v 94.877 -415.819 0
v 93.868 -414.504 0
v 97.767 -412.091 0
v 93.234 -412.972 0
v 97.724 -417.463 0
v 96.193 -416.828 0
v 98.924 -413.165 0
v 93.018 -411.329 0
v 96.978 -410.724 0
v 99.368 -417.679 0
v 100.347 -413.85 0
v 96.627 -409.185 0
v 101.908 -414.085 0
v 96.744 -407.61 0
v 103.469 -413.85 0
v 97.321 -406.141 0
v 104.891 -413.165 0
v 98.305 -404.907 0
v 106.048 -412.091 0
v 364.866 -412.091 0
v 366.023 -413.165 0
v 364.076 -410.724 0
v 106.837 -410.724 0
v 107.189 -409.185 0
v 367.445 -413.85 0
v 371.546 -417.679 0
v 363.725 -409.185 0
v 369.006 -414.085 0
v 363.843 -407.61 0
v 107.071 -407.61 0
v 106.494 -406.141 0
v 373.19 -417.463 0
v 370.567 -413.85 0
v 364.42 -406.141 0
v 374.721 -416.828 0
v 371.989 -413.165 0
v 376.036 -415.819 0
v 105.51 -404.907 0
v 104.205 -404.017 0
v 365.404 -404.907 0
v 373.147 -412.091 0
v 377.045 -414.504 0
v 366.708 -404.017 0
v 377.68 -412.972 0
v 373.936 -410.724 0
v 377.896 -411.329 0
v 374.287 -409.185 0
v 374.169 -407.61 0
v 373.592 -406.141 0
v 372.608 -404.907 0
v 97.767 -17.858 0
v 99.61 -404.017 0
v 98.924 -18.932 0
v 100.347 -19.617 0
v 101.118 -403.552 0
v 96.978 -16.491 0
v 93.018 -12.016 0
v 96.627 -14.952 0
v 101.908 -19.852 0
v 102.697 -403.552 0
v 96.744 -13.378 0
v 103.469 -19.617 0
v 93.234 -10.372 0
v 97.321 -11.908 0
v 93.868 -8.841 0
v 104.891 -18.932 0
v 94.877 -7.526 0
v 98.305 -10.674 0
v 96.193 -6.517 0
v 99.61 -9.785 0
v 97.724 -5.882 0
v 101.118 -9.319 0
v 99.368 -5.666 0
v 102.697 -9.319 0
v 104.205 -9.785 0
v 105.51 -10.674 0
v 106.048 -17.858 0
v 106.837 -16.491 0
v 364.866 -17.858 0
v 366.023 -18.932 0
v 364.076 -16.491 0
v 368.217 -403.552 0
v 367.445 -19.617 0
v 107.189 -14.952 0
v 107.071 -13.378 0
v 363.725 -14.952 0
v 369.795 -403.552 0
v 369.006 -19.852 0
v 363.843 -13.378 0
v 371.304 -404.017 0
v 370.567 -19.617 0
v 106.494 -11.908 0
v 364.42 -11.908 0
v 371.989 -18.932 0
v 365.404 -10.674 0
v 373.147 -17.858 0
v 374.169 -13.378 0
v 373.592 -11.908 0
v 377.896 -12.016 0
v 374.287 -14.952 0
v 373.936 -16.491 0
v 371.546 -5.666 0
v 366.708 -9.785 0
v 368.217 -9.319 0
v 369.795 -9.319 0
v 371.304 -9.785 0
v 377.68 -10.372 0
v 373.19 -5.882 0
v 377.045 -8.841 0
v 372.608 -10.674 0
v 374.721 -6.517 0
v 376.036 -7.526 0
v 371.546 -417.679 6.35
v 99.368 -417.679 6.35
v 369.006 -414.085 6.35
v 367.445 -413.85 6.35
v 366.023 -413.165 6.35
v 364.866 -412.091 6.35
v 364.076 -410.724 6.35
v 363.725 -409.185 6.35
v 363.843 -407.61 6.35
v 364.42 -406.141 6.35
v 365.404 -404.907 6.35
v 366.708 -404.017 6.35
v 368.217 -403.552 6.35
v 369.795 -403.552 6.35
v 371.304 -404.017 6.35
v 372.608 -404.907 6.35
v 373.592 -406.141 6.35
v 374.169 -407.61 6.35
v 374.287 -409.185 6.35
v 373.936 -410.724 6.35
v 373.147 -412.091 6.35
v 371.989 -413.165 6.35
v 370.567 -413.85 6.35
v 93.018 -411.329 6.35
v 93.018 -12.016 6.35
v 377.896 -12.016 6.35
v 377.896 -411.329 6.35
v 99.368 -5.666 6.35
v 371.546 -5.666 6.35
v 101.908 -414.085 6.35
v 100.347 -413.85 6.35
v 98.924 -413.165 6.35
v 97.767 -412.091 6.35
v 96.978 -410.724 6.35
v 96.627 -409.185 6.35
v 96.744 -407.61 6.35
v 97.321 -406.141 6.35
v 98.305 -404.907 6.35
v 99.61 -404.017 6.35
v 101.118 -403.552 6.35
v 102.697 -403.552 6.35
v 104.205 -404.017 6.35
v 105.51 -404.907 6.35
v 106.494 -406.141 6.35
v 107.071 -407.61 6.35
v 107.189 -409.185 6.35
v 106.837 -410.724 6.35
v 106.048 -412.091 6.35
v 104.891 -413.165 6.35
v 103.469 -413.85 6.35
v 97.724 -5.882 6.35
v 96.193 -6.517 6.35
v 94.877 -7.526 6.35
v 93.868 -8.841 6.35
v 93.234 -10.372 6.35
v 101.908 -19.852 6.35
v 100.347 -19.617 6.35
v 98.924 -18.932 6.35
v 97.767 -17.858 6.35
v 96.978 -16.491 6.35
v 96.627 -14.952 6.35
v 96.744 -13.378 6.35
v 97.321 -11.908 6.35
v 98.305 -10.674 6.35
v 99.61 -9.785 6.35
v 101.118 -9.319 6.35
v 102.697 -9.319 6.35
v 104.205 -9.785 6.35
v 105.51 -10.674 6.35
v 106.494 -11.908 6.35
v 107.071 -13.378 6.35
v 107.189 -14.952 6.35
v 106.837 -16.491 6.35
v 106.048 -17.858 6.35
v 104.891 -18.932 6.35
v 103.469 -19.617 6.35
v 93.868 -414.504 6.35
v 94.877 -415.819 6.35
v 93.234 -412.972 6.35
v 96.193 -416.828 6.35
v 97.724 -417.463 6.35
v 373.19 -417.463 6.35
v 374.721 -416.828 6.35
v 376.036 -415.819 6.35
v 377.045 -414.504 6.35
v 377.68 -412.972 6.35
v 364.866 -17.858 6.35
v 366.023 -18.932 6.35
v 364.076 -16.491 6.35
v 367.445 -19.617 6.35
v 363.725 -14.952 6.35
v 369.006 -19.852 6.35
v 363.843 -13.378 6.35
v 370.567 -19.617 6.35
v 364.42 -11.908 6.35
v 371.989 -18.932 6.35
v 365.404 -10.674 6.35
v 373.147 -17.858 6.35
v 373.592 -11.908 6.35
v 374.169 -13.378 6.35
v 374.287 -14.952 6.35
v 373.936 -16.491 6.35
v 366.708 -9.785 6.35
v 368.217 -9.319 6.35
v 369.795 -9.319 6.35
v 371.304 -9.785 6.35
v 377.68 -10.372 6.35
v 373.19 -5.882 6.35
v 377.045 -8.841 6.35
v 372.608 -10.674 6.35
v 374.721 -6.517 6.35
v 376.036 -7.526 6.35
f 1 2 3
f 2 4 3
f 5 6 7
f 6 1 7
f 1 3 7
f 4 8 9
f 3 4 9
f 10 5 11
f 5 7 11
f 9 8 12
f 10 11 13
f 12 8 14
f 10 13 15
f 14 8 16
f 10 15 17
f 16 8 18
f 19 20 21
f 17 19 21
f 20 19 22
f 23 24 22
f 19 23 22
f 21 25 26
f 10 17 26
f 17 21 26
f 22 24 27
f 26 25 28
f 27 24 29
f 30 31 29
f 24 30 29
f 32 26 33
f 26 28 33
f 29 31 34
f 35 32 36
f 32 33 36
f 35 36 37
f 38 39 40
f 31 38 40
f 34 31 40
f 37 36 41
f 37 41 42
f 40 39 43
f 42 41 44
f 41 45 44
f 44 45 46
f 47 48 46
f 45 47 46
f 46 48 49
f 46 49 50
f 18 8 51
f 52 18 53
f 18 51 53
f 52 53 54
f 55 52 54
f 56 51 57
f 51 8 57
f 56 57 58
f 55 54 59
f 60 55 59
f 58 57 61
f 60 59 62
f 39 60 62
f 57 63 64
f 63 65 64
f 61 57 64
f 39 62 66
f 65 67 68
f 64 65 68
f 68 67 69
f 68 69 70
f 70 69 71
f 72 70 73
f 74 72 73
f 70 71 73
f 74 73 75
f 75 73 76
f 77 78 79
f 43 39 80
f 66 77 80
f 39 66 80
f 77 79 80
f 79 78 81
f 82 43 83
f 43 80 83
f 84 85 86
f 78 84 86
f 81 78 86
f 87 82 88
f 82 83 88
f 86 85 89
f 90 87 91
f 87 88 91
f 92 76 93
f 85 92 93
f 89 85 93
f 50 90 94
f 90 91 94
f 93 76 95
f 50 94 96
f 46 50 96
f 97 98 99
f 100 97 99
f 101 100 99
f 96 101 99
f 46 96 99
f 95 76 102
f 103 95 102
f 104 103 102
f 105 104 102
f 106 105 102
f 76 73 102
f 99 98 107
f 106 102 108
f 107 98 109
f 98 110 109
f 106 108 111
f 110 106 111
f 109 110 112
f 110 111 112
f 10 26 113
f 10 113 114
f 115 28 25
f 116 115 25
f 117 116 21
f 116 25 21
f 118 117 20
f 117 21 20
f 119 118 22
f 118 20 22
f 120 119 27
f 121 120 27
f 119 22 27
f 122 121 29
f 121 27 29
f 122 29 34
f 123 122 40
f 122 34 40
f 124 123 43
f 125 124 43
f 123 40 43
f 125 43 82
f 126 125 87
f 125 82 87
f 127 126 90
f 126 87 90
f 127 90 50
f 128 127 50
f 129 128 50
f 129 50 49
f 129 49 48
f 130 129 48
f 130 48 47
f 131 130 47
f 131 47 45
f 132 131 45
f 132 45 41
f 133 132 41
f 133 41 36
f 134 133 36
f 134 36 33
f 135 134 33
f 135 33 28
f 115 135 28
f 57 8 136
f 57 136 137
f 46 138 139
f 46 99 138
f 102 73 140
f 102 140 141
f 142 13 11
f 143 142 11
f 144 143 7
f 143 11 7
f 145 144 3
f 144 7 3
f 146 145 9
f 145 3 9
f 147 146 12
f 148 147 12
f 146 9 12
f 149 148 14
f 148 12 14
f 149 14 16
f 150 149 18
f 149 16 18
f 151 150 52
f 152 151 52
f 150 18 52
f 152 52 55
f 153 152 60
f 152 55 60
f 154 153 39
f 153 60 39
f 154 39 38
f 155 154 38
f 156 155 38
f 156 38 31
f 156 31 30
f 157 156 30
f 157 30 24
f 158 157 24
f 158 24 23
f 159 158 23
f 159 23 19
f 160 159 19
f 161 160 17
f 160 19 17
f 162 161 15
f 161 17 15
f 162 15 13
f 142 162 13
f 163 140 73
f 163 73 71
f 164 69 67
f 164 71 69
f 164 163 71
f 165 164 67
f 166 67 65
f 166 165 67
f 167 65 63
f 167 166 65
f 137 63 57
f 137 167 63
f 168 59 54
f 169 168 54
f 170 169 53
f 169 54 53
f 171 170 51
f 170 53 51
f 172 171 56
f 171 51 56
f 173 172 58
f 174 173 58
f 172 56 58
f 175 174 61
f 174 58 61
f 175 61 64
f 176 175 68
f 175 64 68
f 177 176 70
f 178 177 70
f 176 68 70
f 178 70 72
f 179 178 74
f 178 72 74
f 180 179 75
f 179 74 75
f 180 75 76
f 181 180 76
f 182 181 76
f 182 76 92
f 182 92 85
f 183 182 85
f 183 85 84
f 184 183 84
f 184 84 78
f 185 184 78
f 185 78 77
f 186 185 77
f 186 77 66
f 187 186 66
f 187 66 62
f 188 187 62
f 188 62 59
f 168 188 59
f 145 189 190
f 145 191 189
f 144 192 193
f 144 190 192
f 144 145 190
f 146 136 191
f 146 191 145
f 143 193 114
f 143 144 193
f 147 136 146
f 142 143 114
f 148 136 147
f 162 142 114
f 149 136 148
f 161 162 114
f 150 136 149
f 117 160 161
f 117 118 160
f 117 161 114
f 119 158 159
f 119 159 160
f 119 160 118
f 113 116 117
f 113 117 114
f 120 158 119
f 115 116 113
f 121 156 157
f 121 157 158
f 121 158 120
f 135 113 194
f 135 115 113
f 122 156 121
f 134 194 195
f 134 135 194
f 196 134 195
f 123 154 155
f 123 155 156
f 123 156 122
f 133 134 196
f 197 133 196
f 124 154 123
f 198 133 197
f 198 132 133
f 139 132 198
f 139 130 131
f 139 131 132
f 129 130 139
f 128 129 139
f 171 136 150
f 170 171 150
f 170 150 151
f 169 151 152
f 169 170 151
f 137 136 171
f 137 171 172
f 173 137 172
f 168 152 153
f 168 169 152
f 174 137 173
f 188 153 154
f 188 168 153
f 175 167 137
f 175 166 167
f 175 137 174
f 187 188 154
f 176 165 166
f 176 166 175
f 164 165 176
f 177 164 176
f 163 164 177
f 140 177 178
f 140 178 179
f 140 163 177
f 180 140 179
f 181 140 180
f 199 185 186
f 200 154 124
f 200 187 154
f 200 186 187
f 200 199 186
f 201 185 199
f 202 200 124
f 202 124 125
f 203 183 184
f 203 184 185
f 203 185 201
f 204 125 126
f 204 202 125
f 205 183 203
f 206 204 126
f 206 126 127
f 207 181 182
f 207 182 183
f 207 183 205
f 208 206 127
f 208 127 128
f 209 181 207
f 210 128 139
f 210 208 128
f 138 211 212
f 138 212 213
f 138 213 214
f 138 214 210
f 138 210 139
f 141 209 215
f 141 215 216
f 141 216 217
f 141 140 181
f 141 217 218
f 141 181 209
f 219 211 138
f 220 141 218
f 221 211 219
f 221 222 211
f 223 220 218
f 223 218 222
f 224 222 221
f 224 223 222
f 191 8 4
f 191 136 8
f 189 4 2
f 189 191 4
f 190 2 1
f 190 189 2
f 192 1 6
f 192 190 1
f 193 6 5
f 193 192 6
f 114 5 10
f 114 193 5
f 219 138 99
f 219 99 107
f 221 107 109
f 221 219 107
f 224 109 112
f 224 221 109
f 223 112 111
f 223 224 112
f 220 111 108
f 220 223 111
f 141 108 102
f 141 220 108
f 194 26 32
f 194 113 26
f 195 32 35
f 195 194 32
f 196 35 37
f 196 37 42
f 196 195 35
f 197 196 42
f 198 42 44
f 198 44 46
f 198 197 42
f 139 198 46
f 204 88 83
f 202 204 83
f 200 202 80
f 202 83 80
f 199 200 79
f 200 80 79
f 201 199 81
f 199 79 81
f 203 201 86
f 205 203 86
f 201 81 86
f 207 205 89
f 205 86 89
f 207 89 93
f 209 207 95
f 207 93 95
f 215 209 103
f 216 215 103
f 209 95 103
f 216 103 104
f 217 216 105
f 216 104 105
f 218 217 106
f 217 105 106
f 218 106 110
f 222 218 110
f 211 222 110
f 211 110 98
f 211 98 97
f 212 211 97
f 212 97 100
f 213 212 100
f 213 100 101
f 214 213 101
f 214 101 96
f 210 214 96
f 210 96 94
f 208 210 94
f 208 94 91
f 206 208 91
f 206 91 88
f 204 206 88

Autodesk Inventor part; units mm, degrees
ref_plane "YZ Plane" through (0, 0, 0) normal (1, 0, 0) x (0, 1, 0)
ref_plane "XZ Plane" through (0, 0, 0) normal (0, 1, 0) x (-1, 0, 0)
ref_plane "XY Plane" through (0, 0, 0) normal (0, 0, 1) x (1, 0, 0)
sketch "Sketch1" plane through (0, 0, 0) normal (0, 0, 1) x (1, 0, 0)
  circle A0 centre (101.9076, -14.556) radius 5.2959 construction
  line L0 (89.2076, -40.4217) -> (89.2076, -1.856) construction
  line L1 (89.2076, -40.4217) -> (127.7733, -1.856) construction
  line L2 (89.2076, -1.856) -> (127.7733, -1.856) construction
  circle A1 centre (369.0061, -14.556) radius 5.2959 construction
  line L3 (381.7061, -1.856) -> (381.7061, -40.4217) construction
  line L4 (343.1404, -1.856) -> (381.7061, -1.856) construction
  line L5 (343.1404, -1.856) -> (381.7061, -40.4217) construction
  circle A2 centre (369.0061, -408.7889) radius 5.2959 construction
  line L6 (381.7061, -382.9233) -> (381.7061, -421.4889) construction
  line L7 (381.7061, -382.9233) -> (343.1404, -421.4889) construction
  line L8 (381.7061, -421.4889) -> (343.1404, -421.4889) construction
  circle A3 centre (101.9076, -408.7889) radius 5.2959 construction
  line L9 (89.2076, -421.4889) -> (89.2076, -382.9233) construction
  line L10 (127.7733, -421.4889) -> (89.2076, -421.4889) construction
  line L11 (127.7733, -421.4889) -> (89.2076, -382.9233) construction
  line L12 (377.8961, -417.6789) -> (93.0176, -417.6789)
  line L13 (93.0176, -417.6789) -> (93.0176, -5.666)
  line L14 (93.0176, -5.666) -> (377.8961, -5.666)
  line L15 (377.8961, -5.666) -> (377.8961, -417.6789)
  point P0 (0, 0)
  dimension "d0" = 3.81
  dimension "d1" = 3.81
  dimension "d2" = 3.81
  dimension "d3" = 3.81
extrude "Extrusion1" add sketch "Sketch1" along normal blind 6.35
sketch "Sketch2" plane through (0, 0, 6.35) normal (0, 0, 1) x (1, 0, 0)
  circle A0 centre (101.9076, -14.556) radius 5.2959 construction
  line L0 (89.2076, -40.4217) -> (89.2076, -1.856) construction
  line L1 (89.2076, -40.4217) -> (127.7733, -1.856) construction
  line L2 (89.2076, -1.856) -> (127.7733, -1.856) construction
  circle A1 centre (369.0061, -14.556) radius 5.2959 construction
  line L3 (381.7061, -1.856) -> (381.7061, -40.4217) construction
  line L4 (343.1404, -1.856) -> (381.7061, -1.856) construction
  line L5 (343.1404, -1.856) -> (381.7061, -40.4217) construction
  circle A2 centre (369.0061, -408.7889) radius 5.2959 construction
  line L6 (381.7061, -382.9233) -> (381.7061, -421.4889) construction
  line L7 (381.7061, -382.9233) -> (343.1404, -421.4889) construction
  line L8 (381.7061, -421.4889) -> (343.1404, -421.4889) construction
  circle A3 centre (101.9076, -408.7889) radius 5.2959 construction
  line L9 (89.2076, -421.4889) -> (89.2076, -382.9233) construction
  line L10 (127.7733, -421.4889) -> (89.2076, -421.4889) construction
  line L11 (127.7733, -421.4889) -> (89.2076, -382.9233) construction
  point P0 (0, 0)
hole "Hole1" at (101.9076, -14.556, 6.35) at (369.0061, -14.556, 6.35) at (369.0061, -408.7889, 6.35) at (101.9076, -408.7889, 6.35) direction (0, 0, -1) diameter 10.5918 end through all thread size "1/2-13 UNC" class "2B" standard "ANSI Unified Screw Threads"
fillet "Fillet1" radius 6.35 4 edges at (93.0176, -5.666, 3.175) (377.8961, -5.666, 3.175) (377.8961, -417.6789, 3.175) (93.0176, -417.6789, 3.175)
properties part number "Door Plate" material "PC/ABS Plastic"
